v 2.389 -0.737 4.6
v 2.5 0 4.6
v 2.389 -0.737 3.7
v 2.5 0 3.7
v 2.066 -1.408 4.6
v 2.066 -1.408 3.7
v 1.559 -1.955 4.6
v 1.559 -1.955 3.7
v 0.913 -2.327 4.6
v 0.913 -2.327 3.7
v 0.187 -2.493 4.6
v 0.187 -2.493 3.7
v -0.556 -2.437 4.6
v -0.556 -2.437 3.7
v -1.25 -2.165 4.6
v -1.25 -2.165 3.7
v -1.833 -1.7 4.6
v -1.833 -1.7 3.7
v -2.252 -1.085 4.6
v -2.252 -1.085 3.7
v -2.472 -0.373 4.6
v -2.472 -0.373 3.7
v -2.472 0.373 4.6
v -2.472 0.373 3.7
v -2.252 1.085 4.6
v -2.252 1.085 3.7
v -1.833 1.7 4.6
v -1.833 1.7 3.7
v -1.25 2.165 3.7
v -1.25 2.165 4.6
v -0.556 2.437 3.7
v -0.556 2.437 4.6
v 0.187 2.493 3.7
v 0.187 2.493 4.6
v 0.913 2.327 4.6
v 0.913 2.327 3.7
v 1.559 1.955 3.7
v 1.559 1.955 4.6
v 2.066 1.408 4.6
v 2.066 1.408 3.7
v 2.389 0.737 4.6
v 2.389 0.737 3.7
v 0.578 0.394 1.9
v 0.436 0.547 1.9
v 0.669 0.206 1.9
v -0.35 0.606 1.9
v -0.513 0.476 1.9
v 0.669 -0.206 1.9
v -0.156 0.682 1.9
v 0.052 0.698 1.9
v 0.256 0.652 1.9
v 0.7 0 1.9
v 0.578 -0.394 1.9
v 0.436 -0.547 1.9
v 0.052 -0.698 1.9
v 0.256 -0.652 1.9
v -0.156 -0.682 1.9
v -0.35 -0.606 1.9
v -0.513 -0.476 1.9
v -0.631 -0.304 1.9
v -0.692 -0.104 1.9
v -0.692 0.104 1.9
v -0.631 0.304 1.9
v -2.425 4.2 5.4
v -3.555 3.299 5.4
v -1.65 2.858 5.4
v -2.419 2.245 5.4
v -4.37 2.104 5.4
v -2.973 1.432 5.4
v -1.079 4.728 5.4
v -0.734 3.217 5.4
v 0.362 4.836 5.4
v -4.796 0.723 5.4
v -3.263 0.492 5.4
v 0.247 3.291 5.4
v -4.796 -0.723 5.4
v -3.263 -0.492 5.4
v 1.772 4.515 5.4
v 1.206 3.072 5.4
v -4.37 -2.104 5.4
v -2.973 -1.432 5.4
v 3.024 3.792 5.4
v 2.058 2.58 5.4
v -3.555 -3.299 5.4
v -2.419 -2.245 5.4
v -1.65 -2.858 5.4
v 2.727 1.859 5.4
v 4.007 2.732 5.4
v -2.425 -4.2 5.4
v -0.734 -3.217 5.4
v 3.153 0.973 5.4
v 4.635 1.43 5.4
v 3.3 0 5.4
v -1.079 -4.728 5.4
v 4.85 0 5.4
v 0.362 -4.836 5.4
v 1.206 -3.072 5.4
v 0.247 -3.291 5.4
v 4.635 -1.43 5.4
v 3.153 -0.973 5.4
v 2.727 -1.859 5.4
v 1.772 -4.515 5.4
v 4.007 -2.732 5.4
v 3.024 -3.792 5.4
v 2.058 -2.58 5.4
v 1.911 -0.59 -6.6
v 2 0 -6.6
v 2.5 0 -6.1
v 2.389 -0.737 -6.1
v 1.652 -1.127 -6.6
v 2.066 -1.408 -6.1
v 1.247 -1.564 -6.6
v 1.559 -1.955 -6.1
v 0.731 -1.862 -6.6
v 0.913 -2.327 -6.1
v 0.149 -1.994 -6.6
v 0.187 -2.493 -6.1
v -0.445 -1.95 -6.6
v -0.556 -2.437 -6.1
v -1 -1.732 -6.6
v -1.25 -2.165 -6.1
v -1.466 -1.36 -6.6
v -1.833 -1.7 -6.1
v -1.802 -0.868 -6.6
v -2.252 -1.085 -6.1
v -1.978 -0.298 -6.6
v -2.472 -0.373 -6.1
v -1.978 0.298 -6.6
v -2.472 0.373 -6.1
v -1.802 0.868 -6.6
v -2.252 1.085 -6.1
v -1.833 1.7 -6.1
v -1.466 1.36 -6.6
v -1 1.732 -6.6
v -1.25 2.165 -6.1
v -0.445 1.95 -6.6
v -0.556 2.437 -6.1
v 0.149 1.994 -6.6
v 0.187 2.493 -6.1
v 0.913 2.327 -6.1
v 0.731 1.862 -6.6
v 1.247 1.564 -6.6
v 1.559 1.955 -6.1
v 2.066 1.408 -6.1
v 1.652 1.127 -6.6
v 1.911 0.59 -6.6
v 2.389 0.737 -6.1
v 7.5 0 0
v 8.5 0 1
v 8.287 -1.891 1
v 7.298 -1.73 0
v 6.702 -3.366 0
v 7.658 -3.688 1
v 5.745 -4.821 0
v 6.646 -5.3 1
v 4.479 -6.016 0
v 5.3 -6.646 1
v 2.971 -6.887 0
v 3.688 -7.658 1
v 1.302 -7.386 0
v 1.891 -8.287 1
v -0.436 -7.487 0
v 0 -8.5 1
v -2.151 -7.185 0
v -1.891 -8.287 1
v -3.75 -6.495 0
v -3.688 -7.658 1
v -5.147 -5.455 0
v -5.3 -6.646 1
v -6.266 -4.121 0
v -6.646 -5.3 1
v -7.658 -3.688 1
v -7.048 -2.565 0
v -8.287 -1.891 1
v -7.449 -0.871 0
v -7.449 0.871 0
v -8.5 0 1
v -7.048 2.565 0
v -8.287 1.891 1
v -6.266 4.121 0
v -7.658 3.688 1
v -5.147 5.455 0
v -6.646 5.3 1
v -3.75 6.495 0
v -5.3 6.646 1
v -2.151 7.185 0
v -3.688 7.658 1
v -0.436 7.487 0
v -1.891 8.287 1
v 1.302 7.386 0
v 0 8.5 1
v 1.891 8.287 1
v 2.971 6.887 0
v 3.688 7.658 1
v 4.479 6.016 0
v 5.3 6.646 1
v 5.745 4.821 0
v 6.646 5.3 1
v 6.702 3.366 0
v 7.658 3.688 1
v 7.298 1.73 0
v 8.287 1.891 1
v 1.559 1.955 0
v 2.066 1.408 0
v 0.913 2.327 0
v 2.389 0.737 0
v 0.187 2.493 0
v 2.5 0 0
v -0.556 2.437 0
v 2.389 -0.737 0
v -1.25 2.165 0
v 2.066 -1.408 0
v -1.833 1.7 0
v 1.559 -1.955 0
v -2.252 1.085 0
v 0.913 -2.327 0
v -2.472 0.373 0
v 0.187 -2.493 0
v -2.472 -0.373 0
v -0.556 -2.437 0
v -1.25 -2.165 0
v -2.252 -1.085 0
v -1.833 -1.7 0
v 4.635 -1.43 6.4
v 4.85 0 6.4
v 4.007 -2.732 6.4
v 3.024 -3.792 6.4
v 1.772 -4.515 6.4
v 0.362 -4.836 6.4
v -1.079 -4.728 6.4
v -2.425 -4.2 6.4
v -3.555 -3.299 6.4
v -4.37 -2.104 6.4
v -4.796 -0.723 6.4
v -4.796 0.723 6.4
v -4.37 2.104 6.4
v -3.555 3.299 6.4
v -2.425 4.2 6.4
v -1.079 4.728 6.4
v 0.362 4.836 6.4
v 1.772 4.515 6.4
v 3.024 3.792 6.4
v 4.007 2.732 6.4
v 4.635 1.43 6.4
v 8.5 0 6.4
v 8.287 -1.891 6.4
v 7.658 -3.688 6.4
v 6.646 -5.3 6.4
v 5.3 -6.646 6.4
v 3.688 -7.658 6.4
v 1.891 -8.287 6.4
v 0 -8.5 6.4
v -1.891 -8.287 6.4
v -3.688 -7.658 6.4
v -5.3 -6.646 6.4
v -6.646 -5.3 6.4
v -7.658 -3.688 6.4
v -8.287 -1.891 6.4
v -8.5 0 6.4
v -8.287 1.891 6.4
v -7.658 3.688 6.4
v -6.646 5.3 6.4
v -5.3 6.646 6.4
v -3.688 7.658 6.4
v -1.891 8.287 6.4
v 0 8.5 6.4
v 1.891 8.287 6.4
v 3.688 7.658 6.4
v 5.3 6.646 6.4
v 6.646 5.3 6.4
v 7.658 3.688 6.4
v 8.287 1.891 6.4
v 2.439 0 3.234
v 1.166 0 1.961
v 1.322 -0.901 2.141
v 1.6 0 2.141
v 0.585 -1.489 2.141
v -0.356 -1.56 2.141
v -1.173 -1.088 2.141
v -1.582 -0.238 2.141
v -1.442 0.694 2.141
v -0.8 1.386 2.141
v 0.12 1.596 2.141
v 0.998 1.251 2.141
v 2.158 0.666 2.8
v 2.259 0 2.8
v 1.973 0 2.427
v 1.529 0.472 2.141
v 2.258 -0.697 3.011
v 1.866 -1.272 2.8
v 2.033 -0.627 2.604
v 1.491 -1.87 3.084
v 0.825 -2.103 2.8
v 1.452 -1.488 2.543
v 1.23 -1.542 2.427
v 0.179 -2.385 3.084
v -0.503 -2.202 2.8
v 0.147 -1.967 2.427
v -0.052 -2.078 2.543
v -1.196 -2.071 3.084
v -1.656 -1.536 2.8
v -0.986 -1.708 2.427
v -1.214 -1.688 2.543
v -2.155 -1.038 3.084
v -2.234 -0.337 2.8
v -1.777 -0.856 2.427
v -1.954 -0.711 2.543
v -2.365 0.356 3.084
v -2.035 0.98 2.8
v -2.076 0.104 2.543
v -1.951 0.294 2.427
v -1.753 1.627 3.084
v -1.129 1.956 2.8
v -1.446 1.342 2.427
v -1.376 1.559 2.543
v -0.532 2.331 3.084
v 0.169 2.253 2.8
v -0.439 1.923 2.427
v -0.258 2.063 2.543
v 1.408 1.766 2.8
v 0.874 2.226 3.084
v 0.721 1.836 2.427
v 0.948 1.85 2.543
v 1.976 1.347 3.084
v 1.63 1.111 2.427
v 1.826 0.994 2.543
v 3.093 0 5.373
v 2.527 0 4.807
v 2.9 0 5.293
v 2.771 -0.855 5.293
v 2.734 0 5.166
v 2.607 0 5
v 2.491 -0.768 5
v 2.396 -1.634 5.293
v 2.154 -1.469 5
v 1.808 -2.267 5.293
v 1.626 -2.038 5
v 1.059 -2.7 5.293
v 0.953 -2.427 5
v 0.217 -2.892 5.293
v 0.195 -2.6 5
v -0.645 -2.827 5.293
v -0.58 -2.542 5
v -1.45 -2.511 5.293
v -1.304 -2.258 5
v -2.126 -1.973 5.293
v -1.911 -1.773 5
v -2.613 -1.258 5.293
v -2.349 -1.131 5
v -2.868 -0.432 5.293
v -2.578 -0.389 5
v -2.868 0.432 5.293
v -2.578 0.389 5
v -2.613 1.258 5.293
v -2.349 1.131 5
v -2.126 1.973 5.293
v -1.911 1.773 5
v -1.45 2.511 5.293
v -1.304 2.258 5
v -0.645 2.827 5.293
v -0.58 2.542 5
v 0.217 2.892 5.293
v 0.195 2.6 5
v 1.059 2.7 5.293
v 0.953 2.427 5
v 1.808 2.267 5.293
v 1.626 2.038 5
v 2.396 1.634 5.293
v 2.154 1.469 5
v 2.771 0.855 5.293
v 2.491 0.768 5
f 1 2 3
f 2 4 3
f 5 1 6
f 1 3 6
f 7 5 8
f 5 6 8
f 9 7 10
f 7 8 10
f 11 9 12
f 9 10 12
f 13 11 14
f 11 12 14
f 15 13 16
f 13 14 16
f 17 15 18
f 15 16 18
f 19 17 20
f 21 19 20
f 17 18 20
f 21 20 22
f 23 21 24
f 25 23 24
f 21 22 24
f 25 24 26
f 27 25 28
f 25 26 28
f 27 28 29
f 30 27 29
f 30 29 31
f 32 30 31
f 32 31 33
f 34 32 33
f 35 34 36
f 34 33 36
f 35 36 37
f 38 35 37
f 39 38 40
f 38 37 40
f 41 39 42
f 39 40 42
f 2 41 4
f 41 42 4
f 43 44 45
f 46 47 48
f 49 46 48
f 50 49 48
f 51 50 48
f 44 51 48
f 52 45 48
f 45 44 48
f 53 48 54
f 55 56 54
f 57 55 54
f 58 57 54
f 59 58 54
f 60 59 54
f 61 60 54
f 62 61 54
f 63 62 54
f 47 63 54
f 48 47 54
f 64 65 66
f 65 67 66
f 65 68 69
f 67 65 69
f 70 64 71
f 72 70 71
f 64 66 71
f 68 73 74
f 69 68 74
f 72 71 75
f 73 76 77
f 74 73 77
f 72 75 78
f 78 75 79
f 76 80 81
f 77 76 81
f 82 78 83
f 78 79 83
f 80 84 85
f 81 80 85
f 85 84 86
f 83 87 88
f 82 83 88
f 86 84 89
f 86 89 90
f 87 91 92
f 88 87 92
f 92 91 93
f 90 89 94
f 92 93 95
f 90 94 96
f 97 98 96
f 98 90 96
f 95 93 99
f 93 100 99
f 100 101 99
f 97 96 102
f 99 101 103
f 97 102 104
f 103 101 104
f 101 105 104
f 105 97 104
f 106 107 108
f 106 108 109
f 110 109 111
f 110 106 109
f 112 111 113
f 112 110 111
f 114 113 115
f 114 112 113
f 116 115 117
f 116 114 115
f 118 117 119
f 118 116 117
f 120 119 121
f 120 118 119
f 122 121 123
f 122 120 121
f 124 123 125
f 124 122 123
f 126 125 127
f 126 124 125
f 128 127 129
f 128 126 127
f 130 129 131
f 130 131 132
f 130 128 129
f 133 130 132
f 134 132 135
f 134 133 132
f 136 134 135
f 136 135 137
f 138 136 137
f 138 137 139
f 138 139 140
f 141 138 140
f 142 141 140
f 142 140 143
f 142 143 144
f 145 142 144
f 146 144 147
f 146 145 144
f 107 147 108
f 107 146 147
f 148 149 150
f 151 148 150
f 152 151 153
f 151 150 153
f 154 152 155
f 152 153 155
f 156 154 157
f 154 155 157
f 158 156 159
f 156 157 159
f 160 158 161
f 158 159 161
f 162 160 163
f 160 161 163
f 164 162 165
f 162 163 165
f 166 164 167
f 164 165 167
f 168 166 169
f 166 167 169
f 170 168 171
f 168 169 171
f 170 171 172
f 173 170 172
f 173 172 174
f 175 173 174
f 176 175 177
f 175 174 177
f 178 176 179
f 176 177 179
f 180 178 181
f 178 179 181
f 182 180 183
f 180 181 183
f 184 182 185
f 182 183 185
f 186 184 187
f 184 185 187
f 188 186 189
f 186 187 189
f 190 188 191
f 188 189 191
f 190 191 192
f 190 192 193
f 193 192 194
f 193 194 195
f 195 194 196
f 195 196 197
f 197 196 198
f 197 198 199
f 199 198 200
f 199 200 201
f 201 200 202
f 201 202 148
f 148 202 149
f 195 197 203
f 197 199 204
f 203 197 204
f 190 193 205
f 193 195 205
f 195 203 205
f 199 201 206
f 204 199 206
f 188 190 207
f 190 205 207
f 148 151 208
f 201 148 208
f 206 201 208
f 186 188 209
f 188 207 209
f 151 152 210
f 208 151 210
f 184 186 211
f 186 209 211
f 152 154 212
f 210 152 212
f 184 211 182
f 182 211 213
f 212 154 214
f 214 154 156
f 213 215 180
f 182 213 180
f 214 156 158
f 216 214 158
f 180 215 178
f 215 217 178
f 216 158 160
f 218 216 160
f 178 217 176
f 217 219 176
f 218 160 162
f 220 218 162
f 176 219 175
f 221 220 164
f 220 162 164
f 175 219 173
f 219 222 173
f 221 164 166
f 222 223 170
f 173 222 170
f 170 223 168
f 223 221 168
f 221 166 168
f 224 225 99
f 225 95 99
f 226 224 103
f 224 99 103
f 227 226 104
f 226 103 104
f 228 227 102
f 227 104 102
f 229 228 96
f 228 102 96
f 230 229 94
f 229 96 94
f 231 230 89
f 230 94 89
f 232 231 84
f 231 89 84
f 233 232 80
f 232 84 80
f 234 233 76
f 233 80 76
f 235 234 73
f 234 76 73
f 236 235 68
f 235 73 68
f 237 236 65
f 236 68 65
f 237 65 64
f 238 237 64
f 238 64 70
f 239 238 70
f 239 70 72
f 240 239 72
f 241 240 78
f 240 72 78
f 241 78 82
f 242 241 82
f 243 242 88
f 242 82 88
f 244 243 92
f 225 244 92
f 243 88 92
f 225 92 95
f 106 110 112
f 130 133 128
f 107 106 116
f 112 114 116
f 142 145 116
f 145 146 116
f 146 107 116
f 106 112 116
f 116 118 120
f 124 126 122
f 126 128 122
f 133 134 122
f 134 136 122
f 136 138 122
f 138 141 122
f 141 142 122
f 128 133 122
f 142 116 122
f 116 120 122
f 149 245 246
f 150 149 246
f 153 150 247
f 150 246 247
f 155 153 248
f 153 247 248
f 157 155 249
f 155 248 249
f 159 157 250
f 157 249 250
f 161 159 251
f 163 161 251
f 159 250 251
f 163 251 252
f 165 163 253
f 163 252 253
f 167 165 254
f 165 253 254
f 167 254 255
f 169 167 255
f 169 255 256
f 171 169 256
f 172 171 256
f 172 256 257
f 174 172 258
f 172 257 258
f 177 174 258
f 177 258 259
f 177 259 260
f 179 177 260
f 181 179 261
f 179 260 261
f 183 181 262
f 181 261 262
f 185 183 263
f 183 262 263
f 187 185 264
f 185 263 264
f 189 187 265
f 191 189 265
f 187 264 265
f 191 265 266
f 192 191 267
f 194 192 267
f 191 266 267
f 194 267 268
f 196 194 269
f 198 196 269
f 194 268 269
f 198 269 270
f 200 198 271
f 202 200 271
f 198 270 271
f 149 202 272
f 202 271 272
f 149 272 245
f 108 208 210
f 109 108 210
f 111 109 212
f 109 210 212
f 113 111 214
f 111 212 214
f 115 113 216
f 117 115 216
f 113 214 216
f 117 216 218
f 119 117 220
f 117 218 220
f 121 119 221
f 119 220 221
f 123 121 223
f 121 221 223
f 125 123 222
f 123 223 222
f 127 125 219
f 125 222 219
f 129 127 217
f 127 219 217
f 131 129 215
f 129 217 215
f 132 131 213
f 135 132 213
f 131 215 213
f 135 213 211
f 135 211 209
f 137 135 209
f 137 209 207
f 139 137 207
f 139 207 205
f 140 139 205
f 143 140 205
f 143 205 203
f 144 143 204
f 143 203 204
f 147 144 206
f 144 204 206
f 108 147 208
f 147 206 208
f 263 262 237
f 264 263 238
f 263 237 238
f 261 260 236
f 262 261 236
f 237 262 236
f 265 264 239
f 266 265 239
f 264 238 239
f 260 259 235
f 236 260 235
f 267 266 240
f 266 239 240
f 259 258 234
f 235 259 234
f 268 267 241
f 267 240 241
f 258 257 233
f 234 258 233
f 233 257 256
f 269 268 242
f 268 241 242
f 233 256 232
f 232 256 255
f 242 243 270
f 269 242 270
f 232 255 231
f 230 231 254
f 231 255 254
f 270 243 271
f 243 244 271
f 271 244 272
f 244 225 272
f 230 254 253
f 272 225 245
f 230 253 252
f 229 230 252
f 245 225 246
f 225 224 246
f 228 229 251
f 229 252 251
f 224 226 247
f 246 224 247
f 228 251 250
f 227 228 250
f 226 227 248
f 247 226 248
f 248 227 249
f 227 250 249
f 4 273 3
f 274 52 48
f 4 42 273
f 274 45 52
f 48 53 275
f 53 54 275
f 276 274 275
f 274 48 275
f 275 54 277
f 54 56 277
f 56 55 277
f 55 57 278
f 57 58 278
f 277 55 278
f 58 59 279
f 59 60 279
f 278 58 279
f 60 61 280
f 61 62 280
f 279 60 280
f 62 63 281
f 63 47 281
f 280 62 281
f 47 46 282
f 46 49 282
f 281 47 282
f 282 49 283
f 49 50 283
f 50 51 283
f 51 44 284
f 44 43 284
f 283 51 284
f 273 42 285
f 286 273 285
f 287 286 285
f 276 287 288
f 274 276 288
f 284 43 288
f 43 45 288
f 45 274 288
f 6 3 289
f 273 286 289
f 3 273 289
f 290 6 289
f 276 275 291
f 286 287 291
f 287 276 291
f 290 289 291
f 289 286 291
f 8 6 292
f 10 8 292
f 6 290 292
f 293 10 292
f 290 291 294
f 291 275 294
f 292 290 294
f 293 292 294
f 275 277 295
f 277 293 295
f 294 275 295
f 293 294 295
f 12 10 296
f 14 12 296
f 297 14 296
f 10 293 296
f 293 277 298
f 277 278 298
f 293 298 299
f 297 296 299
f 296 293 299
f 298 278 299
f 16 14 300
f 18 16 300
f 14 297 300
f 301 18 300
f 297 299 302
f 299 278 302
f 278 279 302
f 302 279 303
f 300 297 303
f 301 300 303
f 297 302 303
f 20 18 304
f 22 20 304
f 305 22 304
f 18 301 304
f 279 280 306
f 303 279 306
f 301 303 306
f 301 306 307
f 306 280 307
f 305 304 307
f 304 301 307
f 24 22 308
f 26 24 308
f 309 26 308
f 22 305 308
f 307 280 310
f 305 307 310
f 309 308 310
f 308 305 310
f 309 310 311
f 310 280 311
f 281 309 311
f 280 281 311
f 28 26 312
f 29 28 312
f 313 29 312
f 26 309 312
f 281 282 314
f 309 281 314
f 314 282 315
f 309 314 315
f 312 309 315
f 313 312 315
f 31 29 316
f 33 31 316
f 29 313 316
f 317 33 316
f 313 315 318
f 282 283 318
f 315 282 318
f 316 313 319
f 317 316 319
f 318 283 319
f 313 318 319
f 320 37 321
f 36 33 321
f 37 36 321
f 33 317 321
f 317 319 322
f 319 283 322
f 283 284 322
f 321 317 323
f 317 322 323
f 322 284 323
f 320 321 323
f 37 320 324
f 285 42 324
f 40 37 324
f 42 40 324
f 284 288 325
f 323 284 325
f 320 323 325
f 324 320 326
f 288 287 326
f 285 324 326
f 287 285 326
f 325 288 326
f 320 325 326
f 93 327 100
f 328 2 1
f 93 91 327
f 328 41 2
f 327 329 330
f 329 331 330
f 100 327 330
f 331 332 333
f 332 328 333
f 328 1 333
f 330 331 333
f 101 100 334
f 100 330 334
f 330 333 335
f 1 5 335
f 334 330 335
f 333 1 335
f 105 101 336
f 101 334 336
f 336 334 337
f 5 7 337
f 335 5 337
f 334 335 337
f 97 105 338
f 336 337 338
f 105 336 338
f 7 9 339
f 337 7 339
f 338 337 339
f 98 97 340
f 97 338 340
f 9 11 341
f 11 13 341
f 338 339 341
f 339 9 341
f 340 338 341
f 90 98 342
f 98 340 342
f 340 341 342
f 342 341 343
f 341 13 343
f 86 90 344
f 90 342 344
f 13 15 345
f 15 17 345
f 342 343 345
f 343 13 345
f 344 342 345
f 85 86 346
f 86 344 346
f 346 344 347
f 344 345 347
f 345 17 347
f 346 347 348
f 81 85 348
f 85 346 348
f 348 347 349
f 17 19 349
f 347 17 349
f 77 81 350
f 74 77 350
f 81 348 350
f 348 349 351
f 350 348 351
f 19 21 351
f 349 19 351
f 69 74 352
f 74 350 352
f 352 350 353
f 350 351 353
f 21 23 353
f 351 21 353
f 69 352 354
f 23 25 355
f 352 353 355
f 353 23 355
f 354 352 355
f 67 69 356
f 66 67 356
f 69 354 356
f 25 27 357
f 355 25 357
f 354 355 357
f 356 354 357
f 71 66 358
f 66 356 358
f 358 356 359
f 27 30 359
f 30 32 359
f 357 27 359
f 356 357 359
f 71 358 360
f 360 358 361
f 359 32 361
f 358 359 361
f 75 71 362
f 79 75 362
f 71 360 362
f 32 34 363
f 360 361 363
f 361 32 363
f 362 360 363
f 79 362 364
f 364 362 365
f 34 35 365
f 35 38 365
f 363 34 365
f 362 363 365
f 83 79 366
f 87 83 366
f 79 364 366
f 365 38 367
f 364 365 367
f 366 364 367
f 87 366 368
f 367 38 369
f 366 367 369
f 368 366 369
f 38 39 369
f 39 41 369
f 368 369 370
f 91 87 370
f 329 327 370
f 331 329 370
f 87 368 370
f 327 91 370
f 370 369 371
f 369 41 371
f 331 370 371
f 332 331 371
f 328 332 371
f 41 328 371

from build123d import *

# Parameters (mm, degrees)
F2_SIZE = 1
F3_SIZE = 0.5


with BuildPart() as f1:
    # F0 (on Front) → F1 (revolve)
    with BuildSketch(Plane.XZ):
        with BuildLine():
            Line((4.85, 5.4), (3.3, 5.4))
            ThreePointArc((3.3, 5.4), (2.734315, 5.165685), (2.5, 4.6))
            Line((2.5, 4.6), (2.5, 3.7))
            ThreePointArc((2.5, 3.7), (1.972792, 2.427208), (0.7, 1.9))
            Line((0.7, 1.9), (0, 1.9))
            Line((0, 1.9), (0, -6.6))
            Line((0, -6.6), (2.5, -6.6))
            Line((2.5, -6.6), (2.5, 0))
            Line((2.5, 0), (8.5, 0))
            Line((8.5, 0), (8.5, 6.4))
            Line((8.5, 6.4), (4.85, 6.4))
            Line((4.85, 6.4), (4.85, 5.4))
        make_face()
    revolve(axis=Axis((0, 0, -2.35), (0, 0, -1)))

    # F2
    f2_edges = [f1.edges().sort_by_distance(p)[0] for p in [
        (-8.5, 0, 0),
    ]]
    chamfer(f2_edges, length=F2_SIZE)

    # F3
    f3_edges = [f1.edges().sort_by_distance(p)[0] for p in [
        (-2.5, 0, -6.6),
    ]]
    chamfer(f3_edges, length=F3_SIZE)


solid = f1.part
